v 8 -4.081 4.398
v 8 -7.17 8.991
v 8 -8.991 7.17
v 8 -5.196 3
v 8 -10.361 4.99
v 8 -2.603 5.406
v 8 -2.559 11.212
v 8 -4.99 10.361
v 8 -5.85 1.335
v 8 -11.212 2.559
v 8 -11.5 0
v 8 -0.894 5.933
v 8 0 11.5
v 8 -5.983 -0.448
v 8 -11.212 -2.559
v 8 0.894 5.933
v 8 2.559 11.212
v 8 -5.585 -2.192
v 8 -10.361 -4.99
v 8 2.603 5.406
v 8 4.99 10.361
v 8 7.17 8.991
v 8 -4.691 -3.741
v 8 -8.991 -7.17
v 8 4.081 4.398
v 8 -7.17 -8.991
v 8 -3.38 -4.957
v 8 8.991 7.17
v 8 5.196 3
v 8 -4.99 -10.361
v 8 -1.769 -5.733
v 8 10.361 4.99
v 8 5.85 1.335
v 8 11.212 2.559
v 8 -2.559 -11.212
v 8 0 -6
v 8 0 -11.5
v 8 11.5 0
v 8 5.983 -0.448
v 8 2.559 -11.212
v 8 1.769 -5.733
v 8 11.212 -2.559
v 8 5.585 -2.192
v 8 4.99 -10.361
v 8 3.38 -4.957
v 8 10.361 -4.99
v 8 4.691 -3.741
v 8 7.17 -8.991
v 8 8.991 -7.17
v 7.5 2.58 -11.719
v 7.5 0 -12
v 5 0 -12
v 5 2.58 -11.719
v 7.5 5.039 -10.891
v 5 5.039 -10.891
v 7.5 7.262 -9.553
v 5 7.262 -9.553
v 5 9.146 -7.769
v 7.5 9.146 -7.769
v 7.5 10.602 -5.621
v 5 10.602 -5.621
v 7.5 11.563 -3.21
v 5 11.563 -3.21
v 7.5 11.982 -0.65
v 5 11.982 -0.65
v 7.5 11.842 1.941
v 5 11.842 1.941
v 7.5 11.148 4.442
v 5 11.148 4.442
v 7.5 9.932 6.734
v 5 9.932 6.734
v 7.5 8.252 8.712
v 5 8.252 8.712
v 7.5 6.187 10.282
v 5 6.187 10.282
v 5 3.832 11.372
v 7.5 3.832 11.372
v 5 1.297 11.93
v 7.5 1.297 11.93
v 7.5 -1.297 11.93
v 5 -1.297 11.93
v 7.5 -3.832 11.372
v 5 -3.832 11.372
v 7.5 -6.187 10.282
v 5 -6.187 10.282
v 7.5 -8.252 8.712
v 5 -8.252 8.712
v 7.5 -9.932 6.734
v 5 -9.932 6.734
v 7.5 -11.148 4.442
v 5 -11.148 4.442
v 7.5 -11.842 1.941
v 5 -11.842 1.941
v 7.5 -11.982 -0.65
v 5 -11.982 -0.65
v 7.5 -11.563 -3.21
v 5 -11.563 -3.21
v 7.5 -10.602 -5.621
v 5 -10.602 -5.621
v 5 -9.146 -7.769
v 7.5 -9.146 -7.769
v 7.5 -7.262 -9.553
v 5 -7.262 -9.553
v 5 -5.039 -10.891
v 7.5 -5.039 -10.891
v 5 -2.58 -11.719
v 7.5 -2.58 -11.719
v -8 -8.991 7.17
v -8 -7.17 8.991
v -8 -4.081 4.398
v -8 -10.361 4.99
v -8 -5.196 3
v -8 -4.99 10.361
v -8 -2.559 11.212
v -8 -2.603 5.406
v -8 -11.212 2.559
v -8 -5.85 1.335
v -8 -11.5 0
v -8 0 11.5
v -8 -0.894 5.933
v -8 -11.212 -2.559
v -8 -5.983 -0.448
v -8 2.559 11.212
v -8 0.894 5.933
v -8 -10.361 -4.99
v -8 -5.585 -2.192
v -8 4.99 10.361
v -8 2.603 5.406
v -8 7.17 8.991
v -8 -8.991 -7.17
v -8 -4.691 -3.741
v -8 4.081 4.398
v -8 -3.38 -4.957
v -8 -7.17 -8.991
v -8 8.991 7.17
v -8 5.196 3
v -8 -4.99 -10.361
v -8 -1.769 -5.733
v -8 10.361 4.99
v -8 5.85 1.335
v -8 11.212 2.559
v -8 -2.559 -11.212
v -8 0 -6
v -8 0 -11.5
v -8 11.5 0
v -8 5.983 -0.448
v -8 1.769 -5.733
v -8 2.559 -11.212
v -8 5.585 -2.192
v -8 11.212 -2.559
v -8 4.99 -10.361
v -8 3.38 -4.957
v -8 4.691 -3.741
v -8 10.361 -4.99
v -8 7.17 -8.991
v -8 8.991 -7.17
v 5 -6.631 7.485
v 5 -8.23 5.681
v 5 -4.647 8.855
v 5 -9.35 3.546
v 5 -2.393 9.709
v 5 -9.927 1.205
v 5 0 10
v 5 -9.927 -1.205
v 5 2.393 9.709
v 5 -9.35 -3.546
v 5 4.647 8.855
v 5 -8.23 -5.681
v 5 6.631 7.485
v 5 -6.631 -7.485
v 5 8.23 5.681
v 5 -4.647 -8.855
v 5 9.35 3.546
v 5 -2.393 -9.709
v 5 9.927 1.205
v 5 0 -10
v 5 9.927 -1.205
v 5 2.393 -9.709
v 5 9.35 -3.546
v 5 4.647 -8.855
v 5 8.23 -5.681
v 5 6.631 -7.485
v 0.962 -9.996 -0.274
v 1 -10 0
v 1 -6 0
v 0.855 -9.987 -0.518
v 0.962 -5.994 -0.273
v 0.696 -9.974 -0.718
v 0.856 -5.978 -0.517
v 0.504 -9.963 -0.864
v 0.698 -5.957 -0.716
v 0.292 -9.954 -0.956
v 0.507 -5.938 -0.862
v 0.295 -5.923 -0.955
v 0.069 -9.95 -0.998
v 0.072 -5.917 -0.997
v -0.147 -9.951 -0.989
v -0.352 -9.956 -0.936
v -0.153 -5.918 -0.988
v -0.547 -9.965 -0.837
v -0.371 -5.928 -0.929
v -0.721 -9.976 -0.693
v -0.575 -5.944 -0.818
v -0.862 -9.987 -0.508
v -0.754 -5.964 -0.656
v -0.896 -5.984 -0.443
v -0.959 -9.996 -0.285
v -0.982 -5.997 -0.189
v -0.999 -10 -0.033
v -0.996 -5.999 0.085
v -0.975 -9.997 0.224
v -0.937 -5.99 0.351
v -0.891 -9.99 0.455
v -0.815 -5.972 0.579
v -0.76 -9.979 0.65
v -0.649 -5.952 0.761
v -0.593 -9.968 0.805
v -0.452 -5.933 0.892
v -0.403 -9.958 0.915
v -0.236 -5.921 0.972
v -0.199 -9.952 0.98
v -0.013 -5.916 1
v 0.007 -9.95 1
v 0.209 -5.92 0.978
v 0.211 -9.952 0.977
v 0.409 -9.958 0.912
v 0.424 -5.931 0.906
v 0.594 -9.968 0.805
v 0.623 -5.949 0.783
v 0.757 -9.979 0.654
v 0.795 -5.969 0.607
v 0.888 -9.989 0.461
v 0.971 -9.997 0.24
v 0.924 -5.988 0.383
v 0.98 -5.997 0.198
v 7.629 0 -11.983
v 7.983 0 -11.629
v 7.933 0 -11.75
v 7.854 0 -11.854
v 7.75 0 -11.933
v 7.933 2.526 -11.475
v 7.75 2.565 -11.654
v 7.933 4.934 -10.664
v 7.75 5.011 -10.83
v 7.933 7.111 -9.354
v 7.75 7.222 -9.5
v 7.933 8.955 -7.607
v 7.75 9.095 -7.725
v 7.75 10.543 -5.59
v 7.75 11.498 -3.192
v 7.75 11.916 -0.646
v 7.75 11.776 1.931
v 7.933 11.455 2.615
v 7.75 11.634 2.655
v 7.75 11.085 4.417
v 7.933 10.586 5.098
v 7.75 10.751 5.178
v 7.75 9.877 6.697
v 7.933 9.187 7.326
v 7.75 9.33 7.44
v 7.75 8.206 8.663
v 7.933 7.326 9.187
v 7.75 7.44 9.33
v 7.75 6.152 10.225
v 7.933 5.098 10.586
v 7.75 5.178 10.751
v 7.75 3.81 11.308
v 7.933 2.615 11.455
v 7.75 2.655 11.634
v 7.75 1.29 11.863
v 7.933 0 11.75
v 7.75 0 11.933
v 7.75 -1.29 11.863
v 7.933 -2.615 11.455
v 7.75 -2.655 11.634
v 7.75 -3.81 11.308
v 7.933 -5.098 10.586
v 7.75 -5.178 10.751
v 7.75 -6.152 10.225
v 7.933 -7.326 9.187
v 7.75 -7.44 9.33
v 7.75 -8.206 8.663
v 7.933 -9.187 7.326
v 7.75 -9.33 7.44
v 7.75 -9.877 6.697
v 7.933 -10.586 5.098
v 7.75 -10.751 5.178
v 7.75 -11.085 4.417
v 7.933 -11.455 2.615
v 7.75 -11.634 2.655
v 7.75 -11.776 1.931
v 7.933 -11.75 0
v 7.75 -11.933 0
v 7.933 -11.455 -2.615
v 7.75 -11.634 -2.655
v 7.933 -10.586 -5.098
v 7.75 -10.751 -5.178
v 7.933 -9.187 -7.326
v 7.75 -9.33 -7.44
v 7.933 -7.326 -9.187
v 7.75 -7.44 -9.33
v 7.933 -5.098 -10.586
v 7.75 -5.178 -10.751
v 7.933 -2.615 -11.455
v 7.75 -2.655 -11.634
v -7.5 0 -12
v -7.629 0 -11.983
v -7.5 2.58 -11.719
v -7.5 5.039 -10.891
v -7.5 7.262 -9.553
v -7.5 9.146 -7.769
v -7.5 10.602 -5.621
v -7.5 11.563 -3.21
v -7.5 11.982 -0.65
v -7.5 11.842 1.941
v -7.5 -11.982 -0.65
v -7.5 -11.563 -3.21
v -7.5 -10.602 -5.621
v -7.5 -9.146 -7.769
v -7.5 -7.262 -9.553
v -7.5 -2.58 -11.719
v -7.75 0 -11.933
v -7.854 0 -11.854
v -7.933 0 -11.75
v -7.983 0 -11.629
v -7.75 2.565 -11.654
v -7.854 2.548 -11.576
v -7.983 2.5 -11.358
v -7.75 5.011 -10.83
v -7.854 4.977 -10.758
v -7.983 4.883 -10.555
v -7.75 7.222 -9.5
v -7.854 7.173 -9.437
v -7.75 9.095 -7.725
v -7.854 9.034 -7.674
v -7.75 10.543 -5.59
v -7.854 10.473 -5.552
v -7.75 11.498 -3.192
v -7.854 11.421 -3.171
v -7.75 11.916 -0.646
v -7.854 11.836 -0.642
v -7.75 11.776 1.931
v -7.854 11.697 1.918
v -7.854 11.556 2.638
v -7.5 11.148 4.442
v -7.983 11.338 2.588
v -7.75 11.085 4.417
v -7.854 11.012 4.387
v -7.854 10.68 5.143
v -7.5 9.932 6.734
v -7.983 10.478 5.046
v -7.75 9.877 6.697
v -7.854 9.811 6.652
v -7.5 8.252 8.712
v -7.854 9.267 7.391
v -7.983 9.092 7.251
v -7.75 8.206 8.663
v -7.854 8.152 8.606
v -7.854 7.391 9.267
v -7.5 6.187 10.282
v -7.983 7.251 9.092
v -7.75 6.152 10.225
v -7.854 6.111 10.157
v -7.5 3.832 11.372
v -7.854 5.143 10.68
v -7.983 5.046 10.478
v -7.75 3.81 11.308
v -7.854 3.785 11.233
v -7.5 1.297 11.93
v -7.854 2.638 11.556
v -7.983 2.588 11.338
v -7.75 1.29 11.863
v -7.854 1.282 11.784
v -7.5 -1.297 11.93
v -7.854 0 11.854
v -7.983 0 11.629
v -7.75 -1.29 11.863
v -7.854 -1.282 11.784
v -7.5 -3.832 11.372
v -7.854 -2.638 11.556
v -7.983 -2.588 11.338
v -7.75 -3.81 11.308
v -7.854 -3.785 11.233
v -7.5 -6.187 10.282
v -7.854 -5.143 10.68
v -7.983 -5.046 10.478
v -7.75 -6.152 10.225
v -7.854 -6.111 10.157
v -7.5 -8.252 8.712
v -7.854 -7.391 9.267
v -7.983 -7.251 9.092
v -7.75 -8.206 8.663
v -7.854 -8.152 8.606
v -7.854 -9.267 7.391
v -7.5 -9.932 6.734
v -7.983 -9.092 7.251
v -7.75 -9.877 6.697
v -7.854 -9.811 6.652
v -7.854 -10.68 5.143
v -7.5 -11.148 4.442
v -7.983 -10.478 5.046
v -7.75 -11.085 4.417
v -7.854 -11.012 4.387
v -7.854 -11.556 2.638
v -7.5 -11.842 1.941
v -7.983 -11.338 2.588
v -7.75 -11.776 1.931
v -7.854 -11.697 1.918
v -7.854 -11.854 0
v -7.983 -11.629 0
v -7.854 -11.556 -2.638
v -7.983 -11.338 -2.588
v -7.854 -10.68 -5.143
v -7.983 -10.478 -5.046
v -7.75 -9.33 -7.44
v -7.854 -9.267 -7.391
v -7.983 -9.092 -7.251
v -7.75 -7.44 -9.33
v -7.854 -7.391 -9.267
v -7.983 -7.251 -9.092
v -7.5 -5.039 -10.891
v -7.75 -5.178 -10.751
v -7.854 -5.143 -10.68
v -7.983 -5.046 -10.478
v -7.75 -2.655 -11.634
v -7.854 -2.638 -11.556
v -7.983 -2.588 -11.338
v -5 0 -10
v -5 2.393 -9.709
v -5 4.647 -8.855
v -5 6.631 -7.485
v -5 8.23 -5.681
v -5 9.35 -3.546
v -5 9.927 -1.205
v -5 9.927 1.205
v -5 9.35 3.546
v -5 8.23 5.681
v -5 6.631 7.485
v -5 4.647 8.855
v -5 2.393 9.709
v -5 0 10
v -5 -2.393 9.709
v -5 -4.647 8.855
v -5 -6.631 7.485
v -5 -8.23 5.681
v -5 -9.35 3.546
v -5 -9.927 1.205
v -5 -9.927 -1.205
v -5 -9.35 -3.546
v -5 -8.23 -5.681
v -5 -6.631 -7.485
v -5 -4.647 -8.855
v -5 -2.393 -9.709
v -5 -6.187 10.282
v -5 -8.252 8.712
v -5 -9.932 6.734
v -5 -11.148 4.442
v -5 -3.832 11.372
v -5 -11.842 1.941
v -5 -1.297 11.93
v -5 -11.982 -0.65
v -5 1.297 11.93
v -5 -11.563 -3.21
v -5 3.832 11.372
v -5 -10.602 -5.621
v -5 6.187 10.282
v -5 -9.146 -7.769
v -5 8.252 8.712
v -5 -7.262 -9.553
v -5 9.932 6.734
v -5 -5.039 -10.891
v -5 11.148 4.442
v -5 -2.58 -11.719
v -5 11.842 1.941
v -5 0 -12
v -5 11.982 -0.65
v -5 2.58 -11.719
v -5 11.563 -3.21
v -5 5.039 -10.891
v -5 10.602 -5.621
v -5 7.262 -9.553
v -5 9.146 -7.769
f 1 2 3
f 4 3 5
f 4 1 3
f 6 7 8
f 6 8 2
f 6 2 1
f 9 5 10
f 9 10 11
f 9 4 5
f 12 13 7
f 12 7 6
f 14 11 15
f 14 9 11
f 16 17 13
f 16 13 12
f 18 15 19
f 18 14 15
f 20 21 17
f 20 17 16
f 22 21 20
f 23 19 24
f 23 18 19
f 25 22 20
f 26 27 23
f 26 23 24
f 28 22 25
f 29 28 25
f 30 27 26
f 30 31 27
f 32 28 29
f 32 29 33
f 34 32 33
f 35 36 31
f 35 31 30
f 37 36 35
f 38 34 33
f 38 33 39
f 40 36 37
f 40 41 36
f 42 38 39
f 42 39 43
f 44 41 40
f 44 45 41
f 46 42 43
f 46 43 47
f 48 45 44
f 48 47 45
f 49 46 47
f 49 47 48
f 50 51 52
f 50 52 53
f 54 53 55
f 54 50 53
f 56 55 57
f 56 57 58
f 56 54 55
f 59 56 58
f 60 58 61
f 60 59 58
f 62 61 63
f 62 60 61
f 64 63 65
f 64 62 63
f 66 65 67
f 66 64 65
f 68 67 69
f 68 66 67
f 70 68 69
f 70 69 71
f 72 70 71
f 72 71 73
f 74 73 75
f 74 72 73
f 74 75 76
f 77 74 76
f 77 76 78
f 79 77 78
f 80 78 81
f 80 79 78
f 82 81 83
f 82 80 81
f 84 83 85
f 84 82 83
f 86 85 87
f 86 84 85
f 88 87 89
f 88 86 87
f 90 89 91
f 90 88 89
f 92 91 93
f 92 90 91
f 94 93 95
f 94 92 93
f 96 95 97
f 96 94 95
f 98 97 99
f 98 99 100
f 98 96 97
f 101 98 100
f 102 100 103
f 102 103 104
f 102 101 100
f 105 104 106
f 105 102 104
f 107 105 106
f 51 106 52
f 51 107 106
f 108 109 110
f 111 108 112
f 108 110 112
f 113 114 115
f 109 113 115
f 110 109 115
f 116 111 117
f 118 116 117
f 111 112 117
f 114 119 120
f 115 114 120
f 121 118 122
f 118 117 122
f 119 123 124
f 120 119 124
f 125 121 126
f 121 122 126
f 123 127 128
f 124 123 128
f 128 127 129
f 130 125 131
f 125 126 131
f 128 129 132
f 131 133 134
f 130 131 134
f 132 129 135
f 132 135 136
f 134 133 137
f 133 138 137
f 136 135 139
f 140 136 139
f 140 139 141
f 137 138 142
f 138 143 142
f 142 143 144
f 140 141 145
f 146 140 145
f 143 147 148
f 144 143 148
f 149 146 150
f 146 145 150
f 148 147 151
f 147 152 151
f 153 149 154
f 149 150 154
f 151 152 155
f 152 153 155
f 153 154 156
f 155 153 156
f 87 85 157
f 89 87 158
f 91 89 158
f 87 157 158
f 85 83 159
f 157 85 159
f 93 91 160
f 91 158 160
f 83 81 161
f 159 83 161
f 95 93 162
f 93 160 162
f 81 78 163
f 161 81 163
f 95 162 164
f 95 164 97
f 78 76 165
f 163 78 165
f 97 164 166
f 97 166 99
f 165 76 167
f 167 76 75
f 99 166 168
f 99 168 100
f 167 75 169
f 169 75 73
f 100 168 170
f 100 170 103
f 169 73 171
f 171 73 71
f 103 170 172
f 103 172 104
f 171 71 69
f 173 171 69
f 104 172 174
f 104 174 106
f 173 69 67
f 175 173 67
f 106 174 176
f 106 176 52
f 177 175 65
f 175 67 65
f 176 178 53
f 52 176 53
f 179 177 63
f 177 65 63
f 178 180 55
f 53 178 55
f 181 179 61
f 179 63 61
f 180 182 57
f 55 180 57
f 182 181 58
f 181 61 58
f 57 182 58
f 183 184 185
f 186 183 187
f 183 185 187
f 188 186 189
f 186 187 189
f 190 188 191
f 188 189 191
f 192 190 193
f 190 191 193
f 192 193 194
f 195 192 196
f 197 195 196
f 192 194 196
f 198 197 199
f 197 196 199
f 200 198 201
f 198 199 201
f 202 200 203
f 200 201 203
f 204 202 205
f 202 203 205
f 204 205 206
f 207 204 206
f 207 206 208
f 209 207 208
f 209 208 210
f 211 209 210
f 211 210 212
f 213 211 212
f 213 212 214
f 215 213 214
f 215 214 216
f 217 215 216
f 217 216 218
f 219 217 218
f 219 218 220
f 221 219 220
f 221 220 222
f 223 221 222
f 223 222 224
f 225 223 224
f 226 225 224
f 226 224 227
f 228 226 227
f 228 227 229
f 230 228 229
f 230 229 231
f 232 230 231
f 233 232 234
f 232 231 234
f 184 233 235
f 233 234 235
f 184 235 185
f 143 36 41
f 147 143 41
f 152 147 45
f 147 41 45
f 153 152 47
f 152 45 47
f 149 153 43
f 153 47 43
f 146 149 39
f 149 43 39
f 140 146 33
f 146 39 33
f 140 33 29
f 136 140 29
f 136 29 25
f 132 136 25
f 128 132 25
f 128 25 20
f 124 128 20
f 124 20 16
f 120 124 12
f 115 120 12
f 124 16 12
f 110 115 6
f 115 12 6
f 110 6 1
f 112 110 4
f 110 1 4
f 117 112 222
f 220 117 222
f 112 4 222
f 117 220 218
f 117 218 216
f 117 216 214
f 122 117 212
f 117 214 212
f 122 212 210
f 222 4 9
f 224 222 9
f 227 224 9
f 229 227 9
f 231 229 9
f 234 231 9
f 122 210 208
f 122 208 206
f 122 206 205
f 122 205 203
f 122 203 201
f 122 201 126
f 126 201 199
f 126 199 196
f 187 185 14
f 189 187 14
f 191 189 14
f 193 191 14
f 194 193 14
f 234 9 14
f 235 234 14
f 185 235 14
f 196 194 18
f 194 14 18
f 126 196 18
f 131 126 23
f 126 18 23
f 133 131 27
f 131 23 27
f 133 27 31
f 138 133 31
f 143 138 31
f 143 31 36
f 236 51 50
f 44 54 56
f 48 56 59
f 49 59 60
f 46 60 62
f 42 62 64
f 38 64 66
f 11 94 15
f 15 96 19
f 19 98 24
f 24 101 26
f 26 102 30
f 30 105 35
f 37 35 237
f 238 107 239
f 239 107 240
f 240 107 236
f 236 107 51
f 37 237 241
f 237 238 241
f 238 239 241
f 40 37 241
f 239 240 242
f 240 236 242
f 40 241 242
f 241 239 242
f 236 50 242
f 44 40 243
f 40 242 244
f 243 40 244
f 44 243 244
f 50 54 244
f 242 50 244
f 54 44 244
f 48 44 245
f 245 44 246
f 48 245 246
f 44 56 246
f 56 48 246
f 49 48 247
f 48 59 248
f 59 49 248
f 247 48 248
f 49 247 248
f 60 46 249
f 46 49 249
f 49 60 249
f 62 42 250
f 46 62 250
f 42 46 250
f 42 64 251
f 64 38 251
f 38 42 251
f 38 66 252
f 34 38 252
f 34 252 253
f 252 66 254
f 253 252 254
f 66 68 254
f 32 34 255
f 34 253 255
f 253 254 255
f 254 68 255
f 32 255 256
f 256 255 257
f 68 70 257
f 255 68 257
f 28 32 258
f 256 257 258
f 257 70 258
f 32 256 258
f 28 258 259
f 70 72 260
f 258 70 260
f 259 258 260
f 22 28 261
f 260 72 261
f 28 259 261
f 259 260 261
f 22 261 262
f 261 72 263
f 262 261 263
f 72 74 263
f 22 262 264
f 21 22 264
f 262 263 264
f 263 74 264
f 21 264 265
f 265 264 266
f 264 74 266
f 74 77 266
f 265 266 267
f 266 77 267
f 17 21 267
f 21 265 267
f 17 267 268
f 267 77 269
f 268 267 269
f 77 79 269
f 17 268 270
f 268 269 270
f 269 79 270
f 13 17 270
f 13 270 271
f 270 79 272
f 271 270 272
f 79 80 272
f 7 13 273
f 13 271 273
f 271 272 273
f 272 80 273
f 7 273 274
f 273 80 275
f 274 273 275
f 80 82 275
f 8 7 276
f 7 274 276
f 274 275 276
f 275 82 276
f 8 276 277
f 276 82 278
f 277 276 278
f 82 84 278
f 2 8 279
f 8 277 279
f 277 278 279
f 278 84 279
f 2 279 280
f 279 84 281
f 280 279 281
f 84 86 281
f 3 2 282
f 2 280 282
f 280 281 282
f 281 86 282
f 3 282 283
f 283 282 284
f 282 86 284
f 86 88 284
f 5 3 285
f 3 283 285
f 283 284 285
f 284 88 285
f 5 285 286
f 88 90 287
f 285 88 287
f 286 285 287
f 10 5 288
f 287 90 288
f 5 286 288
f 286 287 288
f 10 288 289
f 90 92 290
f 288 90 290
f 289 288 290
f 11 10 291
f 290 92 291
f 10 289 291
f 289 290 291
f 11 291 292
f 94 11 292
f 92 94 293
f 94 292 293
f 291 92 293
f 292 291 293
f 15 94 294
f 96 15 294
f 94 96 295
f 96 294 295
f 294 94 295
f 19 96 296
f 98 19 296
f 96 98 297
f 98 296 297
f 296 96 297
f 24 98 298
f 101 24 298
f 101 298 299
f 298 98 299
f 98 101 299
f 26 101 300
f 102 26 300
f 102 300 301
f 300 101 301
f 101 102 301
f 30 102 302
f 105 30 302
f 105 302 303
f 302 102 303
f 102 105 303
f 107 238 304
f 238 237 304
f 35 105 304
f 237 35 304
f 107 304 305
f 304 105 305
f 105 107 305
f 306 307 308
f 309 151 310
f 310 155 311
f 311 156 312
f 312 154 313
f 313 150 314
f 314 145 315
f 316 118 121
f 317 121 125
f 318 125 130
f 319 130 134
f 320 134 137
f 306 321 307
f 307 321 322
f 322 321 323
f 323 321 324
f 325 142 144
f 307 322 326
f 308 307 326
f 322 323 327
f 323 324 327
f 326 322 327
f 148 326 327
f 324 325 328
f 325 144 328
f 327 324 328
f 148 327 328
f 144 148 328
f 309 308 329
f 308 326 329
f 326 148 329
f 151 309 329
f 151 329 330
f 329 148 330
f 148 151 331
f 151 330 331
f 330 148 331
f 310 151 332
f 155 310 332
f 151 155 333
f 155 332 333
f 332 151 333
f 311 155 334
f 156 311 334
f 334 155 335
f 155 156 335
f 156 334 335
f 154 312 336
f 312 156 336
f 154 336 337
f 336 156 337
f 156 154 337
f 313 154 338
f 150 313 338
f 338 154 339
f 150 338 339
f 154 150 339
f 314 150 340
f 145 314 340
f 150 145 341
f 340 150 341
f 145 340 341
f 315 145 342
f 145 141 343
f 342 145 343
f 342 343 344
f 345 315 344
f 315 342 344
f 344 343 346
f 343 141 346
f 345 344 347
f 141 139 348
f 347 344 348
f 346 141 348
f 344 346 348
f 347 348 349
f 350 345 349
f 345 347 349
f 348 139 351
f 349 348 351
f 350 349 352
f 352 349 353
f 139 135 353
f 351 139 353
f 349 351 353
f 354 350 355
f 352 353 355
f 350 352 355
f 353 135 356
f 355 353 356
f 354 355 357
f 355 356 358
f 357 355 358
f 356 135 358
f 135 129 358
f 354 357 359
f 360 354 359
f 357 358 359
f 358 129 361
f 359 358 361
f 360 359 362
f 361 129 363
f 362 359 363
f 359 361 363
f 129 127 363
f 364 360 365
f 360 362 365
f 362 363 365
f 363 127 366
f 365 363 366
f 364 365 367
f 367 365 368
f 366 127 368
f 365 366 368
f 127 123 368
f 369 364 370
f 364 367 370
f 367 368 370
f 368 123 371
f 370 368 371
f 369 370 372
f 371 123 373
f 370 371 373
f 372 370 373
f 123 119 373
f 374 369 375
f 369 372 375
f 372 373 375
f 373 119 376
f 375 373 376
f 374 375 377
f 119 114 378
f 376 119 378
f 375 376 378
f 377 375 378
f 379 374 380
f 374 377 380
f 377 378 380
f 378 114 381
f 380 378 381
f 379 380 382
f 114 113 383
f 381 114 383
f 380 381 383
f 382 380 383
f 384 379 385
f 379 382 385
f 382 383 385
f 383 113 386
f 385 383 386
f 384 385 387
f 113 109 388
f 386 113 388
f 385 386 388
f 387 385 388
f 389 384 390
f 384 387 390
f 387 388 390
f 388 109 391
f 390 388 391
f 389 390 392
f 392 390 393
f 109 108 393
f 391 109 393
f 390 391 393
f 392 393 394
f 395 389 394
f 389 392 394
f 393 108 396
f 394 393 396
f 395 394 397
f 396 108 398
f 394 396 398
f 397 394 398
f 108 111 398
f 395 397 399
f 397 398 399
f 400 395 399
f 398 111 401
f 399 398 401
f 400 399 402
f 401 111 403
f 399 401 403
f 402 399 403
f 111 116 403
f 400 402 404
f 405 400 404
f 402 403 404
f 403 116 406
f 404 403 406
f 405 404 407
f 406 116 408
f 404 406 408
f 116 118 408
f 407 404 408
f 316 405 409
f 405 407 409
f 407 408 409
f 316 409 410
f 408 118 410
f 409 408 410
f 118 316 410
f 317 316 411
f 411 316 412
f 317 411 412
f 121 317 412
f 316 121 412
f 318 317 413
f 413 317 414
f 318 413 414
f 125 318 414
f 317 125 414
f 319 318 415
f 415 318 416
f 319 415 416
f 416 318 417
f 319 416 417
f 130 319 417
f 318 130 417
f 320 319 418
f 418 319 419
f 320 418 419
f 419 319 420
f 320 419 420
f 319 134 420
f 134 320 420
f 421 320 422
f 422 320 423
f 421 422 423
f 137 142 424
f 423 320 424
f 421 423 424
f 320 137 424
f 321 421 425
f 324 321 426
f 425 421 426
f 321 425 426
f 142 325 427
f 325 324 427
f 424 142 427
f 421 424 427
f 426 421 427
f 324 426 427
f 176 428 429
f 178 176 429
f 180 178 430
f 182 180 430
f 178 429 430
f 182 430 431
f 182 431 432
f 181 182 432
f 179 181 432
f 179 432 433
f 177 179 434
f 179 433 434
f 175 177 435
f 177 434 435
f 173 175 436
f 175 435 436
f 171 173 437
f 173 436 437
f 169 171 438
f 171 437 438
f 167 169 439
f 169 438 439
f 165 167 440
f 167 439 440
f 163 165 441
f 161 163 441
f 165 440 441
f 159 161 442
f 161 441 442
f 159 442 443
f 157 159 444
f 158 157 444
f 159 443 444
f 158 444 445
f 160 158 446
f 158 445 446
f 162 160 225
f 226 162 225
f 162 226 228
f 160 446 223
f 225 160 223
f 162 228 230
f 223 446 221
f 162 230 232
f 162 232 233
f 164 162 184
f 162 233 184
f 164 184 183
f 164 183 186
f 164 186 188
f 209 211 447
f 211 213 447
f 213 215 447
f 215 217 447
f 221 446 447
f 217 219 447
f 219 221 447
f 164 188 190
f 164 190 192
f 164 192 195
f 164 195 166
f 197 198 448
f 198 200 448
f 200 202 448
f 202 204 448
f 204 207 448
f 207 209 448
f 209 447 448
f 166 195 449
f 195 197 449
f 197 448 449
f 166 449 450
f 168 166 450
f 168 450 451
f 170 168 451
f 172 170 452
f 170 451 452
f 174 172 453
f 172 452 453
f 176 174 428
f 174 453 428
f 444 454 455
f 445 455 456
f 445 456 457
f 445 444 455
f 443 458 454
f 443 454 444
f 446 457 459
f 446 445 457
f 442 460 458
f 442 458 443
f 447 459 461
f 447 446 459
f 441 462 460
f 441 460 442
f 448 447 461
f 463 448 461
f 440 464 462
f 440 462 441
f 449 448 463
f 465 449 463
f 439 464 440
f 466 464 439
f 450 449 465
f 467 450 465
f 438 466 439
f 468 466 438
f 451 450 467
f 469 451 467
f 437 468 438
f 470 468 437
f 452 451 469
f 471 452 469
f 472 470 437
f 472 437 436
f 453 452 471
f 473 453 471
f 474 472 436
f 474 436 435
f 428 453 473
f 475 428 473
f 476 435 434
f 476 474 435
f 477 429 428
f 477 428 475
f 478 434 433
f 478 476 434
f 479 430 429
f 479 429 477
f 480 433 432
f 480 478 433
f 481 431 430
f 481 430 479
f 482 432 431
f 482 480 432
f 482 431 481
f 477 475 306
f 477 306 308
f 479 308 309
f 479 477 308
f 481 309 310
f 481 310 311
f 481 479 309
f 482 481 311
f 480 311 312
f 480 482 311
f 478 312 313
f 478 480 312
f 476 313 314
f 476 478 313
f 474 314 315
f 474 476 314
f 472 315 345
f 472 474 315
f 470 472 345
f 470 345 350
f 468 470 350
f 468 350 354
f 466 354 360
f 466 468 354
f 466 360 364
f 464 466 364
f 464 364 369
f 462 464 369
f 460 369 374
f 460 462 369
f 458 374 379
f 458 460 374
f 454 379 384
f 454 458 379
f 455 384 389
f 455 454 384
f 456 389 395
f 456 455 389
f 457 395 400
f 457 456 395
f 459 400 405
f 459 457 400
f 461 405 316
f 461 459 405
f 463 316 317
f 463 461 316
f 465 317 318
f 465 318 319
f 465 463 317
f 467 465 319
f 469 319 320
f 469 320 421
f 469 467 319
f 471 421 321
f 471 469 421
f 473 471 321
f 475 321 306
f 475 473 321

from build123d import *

# Parameters (mm, degrees)
SKETCH_2_R               = 12
EXTRUDE_1_DEPTH          = 8
SKETCH_3_R               = 12
SKETCH_3_R_2             = 10
CUT_EXTRUDE_1_DEPTH      = 5
SKETCH_4_R               = 6
CUT_EXTRUDE_2_DEPTH      = 9
CUT_EXTRUDE_2_DEPTH_BACK = 9
FILLET_1_R               = 0.5
SKETCH_5_R               = 1
CUT_EXTRUDE_3_DEPTH      = 10


with BuildPart() as part:
    # 草图2 → 凸台-拉伸1 (new body, symmetric)
    with BuildSketch(Plane(origin=(0, 0, 0), x_dir=(0, 0, -1), z_dir=(1, 0, 0))):
        Circle(SKETCH_2_R)
    extrude(amount=EXTRUDE_1_DEPTH, both=True)

    # 草图3 → 切除-拉伸1 (cut, symmetric)
    with BuildSketch(Plane(origin=(0, 0, 0), x_dir=(0, 0, -1), z_dir=(1, 0, 0))):
        Circle(SKETCH_3_R)
        Circle(SKETCH_3_R_2, mode=Mode.SUBTRACT)
    extrude(amount=CUT_EXTRUDE_1_DEPTH, both=True, mode=Mode.SUBTRACT)

    # 草图4 → 切除-拉伸2 (cut, two sides)
    with BuildSketch(Plane(origin=(0, 0, 0), x_dir=(0, 0, -1), z_dir=(1, 0, 0))) as cut_extrude_2_sk:
        Circle(SKETCH_4_R)
    extrude(amount=CUT_EXTRUDE_2_DEPTH, mode=Mode.SUBTRACT)
    extrude(cut_extrude_2_sk.sketch, amount=-CUT_EXTRUDE_2_DEPTH_BACK, mode=Mode.SUBTRACT)

    # 圆角1
    fillet_1_edges = [part.edges().sort_by_distance(p)[0] for p in [
        (-8, 0, 12),
        (8, 0, 12),
    ]]
    fillet(fillet_1_edges, radius=FILLET_1_R)

    # 草图5 → 切除-拉伸3 (cut)
    with BuildSketch(Plane(origin=(0, 0, 0), x_dir=(1, 0, 0), z_dir=(0, 1, 0))):
        Circle(SKETCH_5_R)
    extrude(amount=-CUT_EXTRUDE_3_DEPTH, mode=Mode.SUBTRACT)


solid = part.part
